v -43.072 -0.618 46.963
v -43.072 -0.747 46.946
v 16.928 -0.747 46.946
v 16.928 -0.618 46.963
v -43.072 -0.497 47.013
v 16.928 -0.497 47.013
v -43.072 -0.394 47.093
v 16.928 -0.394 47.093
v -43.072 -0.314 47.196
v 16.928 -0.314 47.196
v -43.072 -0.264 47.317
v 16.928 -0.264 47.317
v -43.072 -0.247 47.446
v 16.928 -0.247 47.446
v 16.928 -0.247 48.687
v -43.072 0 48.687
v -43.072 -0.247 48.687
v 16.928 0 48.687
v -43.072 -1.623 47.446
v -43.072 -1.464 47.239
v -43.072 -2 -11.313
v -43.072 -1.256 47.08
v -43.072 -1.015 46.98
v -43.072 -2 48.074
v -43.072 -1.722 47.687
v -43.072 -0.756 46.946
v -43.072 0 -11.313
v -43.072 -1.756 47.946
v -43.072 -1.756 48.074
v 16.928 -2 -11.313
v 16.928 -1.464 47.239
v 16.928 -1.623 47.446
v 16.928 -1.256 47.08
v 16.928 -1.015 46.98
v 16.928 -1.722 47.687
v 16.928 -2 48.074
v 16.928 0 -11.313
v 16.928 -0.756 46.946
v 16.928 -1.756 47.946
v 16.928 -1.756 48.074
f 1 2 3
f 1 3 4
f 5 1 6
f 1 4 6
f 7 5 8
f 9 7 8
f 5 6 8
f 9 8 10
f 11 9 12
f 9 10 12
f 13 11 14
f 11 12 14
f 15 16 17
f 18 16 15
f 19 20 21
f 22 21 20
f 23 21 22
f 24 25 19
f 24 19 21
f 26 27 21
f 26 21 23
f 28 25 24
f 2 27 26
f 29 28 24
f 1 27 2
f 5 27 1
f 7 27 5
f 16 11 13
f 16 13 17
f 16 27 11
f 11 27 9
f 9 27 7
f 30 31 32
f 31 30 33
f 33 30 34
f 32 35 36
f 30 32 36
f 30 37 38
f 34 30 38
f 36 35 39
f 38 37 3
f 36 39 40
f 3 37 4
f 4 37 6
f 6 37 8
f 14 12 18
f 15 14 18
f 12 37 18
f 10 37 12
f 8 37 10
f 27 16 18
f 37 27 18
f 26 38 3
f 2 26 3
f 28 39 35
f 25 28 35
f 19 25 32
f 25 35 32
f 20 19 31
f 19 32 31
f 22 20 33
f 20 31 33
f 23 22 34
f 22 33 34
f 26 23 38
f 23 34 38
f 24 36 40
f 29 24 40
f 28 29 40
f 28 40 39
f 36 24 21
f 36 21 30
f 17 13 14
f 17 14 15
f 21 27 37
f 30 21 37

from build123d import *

# Parameters (mm, degrees)
F0_W     = 60
F0_H     = 60
F1_DEPTH = 2
F3_DEPTH = 60


with BuildPart() as f1:
    # F0 (on Front) → F1 (new body)
    with BuildSketch(Plane.XZ):
        with Locations((-13.071862, 18.687097)):
            Rectangle(F0_W, F0_H)
    extrude(amount=F1_DEPTH)

    # F2 (on face) → F3 (cut)
    with BuildSketch(Plane.YZ.offset(16.928138)):
        with BuildLine():
            Line((-0.247225, 47.446228), (-0.247225, 48.687097))
            Line((-0.247225, 48.687097), (-2, 48.687097))
            Line((-2, 48.687097), (-2, 48.074059))
            Line((-2, 48.074059), (-1.756481, 48.074059))
            Line((-1.756481, 48.074059), (-1.756481, 47.946228))
            ThreePointArc((-1.756481, 47.946228), (-1.463588, 47.239121), (-0.756481, 46.946228))
            Line((-0.756481, 46.946228), (-0.747225, 46.946228))
            ThreePointArc((-0.747225, 46.946228), (-0.393672, 47.092674), (-0.247225, 47.446228))
        make_face()
    extrude(amount=-F3_DEPTH, mode=Mode.SUBTRACT)


solid = f1.part
